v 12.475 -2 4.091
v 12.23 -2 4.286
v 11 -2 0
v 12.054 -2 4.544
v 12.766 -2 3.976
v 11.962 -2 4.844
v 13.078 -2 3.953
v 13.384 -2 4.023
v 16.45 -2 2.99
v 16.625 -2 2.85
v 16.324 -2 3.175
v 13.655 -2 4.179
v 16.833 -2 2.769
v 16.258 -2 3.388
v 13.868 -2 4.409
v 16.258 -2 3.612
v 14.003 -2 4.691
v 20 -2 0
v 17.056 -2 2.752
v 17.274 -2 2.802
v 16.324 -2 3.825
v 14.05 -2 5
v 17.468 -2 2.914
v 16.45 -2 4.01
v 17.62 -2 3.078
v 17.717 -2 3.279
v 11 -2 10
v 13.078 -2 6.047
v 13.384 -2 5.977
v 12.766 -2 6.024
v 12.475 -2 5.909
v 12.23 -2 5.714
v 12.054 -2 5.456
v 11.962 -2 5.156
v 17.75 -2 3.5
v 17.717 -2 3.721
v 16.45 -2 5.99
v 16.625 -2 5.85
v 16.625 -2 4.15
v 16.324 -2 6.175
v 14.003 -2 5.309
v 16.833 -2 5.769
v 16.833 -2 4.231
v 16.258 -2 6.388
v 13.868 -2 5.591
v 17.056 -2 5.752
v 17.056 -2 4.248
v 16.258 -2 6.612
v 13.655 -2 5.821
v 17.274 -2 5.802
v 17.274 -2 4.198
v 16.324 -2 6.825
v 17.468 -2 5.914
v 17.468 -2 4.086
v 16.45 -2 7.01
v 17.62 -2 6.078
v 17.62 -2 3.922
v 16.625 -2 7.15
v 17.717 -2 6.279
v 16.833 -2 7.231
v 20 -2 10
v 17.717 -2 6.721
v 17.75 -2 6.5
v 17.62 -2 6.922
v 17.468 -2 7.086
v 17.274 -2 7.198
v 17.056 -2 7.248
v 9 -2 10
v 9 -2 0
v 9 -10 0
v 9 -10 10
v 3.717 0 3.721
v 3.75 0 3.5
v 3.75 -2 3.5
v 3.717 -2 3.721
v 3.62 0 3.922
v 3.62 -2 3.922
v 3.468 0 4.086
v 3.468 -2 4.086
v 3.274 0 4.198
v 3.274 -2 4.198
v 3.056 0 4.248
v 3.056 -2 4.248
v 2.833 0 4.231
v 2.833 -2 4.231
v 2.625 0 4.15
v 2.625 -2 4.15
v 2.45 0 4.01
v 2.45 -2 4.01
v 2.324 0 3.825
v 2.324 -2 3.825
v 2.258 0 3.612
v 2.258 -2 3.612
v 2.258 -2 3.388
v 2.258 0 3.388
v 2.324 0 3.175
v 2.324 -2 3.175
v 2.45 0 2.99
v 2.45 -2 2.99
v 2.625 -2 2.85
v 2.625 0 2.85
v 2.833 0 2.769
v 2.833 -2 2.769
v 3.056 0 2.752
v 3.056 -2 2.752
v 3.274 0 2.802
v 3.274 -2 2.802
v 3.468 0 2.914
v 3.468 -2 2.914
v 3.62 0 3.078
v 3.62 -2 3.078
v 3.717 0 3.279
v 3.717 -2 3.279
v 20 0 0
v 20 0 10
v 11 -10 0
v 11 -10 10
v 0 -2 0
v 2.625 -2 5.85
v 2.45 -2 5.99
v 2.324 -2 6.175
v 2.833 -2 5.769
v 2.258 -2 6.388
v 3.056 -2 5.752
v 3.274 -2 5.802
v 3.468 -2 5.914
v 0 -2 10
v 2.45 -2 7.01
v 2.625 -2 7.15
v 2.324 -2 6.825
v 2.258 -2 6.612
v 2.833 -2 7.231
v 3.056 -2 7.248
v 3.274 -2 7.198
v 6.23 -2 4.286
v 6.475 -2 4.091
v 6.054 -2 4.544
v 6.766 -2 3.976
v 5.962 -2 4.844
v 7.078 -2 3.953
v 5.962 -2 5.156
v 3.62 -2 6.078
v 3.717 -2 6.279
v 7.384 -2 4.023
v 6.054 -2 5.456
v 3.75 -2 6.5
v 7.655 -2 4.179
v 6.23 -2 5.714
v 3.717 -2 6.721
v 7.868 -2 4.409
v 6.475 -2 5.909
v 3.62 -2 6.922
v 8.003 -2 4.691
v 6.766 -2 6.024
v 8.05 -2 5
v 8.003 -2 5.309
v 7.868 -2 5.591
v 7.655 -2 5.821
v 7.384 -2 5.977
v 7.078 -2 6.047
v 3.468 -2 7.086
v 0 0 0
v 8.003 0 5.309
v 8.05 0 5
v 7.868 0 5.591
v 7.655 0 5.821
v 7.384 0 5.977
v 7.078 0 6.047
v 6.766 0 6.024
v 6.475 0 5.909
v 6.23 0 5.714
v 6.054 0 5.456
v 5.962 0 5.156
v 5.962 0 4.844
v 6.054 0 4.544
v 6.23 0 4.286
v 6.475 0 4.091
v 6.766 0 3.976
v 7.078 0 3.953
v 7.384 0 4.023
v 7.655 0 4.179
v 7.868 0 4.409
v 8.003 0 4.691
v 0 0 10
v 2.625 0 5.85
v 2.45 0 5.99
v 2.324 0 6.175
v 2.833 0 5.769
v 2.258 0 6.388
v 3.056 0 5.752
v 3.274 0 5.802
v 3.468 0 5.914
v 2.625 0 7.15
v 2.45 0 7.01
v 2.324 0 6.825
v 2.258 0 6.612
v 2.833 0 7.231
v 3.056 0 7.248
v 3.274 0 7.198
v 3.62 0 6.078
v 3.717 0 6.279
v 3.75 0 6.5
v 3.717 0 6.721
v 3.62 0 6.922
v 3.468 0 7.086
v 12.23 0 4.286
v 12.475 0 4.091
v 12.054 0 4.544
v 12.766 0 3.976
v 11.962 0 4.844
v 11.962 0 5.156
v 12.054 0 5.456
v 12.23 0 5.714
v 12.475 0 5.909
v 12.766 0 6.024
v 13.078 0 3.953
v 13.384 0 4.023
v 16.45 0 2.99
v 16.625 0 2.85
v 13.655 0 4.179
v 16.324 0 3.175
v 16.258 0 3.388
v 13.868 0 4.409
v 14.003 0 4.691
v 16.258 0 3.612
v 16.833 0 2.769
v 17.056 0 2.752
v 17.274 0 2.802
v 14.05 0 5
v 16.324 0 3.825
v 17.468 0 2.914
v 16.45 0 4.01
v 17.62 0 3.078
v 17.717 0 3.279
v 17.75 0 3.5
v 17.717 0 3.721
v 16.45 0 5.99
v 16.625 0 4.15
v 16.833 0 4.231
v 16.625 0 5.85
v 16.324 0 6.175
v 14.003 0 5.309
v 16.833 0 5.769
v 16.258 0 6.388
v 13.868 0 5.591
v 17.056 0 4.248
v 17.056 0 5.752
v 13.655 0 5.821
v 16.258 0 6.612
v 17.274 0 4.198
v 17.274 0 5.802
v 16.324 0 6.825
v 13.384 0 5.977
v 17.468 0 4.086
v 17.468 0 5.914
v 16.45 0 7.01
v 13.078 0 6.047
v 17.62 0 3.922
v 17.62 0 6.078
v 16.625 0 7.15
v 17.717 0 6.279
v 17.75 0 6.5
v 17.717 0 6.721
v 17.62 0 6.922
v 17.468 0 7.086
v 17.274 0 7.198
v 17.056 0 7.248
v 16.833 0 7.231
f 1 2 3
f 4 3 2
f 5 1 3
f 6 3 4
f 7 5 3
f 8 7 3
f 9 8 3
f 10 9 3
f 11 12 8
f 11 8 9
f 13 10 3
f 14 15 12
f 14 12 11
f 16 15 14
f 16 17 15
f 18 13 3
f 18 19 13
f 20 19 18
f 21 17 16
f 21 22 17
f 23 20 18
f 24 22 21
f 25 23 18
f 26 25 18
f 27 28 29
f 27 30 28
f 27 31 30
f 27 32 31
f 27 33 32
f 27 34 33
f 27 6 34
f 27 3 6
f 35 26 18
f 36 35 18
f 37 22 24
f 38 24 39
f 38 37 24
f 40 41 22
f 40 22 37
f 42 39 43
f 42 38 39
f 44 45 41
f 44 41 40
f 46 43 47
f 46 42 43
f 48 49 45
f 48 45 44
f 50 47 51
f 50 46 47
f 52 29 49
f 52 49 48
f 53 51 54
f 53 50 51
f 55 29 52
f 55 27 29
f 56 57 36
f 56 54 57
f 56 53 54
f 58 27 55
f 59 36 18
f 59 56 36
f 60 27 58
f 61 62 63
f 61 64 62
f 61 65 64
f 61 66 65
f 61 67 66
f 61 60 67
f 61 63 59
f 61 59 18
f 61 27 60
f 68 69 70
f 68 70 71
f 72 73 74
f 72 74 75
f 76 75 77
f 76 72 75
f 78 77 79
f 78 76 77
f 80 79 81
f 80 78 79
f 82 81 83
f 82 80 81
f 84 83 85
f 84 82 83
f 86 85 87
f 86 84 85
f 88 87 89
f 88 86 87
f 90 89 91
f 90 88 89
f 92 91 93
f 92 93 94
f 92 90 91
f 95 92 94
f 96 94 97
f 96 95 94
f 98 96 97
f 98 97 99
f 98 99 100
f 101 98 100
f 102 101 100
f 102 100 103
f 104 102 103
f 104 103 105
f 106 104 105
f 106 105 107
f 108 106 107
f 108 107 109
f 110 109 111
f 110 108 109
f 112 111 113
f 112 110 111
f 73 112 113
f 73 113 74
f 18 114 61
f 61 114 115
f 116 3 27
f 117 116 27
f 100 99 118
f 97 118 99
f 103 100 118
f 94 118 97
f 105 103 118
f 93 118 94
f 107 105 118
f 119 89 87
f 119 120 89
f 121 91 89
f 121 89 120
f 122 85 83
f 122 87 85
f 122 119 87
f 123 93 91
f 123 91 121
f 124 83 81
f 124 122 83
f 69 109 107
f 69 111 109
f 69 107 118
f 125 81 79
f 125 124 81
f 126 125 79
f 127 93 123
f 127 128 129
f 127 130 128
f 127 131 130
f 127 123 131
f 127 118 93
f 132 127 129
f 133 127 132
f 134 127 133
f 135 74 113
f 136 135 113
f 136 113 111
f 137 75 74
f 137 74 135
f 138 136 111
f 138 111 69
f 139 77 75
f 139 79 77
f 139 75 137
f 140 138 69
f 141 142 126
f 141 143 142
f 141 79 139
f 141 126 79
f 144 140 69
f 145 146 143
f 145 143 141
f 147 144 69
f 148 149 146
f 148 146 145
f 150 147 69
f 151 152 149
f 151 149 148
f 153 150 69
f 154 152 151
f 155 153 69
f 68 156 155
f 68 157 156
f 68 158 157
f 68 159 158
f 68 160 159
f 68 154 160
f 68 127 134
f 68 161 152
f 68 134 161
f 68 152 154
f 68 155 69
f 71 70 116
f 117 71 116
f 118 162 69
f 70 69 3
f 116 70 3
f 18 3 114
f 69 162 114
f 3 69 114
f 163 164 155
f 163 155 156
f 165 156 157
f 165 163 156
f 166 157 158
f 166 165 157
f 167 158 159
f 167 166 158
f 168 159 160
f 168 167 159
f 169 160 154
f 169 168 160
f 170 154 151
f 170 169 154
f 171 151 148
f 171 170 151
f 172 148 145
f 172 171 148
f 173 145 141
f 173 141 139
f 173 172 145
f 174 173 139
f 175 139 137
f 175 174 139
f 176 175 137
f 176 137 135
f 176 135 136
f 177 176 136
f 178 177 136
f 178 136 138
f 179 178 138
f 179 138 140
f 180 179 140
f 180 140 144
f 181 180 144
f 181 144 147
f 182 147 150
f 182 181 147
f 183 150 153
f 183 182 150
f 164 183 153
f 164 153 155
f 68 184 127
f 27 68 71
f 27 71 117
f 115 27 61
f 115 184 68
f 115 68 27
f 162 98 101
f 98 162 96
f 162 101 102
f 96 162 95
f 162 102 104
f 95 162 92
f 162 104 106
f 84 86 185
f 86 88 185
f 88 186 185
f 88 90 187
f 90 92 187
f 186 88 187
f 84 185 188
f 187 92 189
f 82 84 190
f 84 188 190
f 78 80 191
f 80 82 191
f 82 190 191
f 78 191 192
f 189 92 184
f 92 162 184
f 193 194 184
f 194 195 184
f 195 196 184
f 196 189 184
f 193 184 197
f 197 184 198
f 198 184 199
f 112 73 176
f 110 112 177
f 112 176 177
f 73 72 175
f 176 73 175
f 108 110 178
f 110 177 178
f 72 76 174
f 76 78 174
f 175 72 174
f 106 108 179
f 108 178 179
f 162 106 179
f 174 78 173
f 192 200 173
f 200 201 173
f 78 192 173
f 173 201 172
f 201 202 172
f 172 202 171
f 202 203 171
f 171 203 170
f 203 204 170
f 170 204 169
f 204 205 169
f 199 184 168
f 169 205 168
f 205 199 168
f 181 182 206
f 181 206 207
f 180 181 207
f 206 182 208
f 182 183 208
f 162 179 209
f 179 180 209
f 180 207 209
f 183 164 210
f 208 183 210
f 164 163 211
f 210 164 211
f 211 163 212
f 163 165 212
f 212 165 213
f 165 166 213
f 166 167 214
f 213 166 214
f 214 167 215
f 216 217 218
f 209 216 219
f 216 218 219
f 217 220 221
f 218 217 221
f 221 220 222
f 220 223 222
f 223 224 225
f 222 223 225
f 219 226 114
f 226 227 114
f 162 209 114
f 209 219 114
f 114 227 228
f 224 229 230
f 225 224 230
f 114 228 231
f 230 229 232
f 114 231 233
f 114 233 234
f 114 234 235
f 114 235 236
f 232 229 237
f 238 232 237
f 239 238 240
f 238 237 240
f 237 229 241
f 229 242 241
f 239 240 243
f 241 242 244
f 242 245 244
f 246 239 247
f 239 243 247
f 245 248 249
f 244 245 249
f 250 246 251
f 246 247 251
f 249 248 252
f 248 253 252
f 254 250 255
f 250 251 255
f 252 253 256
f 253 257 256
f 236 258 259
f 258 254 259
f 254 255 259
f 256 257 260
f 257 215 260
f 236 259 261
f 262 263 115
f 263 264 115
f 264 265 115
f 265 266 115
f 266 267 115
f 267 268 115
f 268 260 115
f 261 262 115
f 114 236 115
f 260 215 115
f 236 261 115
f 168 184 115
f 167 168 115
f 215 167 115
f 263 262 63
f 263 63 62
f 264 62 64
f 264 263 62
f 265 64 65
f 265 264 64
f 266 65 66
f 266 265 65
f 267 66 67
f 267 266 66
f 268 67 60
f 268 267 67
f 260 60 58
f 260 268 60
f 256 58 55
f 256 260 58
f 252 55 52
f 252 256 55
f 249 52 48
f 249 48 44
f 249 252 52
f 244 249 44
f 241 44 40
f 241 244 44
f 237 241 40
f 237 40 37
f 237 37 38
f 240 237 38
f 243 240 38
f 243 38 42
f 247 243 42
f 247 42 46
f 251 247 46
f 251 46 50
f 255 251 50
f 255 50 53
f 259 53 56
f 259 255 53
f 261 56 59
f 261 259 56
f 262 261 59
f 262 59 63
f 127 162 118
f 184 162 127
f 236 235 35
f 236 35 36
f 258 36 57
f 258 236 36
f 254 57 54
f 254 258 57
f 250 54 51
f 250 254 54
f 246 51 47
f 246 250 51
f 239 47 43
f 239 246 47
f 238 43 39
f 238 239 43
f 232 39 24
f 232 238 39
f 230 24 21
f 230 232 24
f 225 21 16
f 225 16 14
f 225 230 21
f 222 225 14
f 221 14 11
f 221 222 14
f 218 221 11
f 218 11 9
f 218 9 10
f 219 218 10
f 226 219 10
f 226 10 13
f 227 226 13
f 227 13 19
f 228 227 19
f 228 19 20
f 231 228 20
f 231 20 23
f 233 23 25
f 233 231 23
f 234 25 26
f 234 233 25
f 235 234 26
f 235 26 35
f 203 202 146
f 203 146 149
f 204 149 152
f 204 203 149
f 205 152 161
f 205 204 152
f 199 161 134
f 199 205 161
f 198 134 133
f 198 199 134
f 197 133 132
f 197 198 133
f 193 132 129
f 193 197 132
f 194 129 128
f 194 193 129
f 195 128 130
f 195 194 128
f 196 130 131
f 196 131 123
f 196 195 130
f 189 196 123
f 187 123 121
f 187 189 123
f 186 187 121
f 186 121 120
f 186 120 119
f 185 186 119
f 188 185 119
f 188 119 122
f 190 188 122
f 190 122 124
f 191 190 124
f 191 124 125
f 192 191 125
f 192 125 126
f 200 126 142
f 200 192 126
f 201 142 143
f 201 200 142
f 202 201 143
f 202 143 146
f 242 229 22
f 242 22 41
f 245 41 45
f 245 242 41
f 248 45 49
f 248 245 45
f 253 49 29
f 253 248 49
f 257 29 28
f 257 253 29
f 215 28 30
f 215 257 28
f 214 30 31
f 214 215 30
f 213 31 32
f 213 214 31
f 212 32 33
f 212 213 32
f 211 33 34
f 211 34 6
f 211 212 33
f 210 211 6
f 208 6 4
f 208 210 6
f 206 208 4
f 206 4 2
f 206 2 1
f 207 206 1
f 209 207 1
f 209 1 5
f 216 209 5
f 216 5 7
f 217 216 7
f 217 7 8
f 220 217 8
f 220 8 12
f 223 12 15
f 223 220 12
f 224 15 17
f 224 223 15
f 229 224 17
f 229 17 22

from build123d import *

# Parameters (mm, degrees)
SKETCH_W     = 20
SKETCH_H     = 10
SKETCH_R     = 0.75
SKETCH_R_2   = 1.05
PAD_DEPTH    = 2
SKETCH001_W  = 2
SKETCH001_H  = 10
PAD001_DEPTH = 8


with BuildPart() as part:
    # Sketch → Pad (new body)
    with BuildSketch(Plane.XZ):
        with Locations((10, 5)):
            Rectangle(SKETCH_W, SKETCH_H)
        with Locations((3, 3.5)):
            Circle(SKETCH_R, mode=Mode.SUBTRACT)
        with Locations((3, 6.5)):
            Circle(SKETCH_R, mode=Mode.SUBTRACT)
        with Locations((17, 3.5)):
            Circle(SKETCH_R, mode=Mode.SUBTRACT)
        with Locations((17, 6.5)):
            Circle(SKETCH_R, mode=Mode.SUBTRACT)
        with Locations((7, 5)):
            Circle(SKETCH_R_2, mode=Mode.SUBTRACT)
        with Locations((13, 5)):
            Circle(SKETCH_R_2, mode=Mode.SUBTRACT)
    extrude(amount=PAD_DEPTH)

    # Sketch001 (on Face12 of Pad) → Pad001 (join)
    with BuildSketch(Plane.XZ.offset(2)):
        with Locations((10, 5)):
            Rectangle(SKETCH001_W, SKETCH001_H)
    extrude(amount=PAD001_DEPTH)


solid = part.part
